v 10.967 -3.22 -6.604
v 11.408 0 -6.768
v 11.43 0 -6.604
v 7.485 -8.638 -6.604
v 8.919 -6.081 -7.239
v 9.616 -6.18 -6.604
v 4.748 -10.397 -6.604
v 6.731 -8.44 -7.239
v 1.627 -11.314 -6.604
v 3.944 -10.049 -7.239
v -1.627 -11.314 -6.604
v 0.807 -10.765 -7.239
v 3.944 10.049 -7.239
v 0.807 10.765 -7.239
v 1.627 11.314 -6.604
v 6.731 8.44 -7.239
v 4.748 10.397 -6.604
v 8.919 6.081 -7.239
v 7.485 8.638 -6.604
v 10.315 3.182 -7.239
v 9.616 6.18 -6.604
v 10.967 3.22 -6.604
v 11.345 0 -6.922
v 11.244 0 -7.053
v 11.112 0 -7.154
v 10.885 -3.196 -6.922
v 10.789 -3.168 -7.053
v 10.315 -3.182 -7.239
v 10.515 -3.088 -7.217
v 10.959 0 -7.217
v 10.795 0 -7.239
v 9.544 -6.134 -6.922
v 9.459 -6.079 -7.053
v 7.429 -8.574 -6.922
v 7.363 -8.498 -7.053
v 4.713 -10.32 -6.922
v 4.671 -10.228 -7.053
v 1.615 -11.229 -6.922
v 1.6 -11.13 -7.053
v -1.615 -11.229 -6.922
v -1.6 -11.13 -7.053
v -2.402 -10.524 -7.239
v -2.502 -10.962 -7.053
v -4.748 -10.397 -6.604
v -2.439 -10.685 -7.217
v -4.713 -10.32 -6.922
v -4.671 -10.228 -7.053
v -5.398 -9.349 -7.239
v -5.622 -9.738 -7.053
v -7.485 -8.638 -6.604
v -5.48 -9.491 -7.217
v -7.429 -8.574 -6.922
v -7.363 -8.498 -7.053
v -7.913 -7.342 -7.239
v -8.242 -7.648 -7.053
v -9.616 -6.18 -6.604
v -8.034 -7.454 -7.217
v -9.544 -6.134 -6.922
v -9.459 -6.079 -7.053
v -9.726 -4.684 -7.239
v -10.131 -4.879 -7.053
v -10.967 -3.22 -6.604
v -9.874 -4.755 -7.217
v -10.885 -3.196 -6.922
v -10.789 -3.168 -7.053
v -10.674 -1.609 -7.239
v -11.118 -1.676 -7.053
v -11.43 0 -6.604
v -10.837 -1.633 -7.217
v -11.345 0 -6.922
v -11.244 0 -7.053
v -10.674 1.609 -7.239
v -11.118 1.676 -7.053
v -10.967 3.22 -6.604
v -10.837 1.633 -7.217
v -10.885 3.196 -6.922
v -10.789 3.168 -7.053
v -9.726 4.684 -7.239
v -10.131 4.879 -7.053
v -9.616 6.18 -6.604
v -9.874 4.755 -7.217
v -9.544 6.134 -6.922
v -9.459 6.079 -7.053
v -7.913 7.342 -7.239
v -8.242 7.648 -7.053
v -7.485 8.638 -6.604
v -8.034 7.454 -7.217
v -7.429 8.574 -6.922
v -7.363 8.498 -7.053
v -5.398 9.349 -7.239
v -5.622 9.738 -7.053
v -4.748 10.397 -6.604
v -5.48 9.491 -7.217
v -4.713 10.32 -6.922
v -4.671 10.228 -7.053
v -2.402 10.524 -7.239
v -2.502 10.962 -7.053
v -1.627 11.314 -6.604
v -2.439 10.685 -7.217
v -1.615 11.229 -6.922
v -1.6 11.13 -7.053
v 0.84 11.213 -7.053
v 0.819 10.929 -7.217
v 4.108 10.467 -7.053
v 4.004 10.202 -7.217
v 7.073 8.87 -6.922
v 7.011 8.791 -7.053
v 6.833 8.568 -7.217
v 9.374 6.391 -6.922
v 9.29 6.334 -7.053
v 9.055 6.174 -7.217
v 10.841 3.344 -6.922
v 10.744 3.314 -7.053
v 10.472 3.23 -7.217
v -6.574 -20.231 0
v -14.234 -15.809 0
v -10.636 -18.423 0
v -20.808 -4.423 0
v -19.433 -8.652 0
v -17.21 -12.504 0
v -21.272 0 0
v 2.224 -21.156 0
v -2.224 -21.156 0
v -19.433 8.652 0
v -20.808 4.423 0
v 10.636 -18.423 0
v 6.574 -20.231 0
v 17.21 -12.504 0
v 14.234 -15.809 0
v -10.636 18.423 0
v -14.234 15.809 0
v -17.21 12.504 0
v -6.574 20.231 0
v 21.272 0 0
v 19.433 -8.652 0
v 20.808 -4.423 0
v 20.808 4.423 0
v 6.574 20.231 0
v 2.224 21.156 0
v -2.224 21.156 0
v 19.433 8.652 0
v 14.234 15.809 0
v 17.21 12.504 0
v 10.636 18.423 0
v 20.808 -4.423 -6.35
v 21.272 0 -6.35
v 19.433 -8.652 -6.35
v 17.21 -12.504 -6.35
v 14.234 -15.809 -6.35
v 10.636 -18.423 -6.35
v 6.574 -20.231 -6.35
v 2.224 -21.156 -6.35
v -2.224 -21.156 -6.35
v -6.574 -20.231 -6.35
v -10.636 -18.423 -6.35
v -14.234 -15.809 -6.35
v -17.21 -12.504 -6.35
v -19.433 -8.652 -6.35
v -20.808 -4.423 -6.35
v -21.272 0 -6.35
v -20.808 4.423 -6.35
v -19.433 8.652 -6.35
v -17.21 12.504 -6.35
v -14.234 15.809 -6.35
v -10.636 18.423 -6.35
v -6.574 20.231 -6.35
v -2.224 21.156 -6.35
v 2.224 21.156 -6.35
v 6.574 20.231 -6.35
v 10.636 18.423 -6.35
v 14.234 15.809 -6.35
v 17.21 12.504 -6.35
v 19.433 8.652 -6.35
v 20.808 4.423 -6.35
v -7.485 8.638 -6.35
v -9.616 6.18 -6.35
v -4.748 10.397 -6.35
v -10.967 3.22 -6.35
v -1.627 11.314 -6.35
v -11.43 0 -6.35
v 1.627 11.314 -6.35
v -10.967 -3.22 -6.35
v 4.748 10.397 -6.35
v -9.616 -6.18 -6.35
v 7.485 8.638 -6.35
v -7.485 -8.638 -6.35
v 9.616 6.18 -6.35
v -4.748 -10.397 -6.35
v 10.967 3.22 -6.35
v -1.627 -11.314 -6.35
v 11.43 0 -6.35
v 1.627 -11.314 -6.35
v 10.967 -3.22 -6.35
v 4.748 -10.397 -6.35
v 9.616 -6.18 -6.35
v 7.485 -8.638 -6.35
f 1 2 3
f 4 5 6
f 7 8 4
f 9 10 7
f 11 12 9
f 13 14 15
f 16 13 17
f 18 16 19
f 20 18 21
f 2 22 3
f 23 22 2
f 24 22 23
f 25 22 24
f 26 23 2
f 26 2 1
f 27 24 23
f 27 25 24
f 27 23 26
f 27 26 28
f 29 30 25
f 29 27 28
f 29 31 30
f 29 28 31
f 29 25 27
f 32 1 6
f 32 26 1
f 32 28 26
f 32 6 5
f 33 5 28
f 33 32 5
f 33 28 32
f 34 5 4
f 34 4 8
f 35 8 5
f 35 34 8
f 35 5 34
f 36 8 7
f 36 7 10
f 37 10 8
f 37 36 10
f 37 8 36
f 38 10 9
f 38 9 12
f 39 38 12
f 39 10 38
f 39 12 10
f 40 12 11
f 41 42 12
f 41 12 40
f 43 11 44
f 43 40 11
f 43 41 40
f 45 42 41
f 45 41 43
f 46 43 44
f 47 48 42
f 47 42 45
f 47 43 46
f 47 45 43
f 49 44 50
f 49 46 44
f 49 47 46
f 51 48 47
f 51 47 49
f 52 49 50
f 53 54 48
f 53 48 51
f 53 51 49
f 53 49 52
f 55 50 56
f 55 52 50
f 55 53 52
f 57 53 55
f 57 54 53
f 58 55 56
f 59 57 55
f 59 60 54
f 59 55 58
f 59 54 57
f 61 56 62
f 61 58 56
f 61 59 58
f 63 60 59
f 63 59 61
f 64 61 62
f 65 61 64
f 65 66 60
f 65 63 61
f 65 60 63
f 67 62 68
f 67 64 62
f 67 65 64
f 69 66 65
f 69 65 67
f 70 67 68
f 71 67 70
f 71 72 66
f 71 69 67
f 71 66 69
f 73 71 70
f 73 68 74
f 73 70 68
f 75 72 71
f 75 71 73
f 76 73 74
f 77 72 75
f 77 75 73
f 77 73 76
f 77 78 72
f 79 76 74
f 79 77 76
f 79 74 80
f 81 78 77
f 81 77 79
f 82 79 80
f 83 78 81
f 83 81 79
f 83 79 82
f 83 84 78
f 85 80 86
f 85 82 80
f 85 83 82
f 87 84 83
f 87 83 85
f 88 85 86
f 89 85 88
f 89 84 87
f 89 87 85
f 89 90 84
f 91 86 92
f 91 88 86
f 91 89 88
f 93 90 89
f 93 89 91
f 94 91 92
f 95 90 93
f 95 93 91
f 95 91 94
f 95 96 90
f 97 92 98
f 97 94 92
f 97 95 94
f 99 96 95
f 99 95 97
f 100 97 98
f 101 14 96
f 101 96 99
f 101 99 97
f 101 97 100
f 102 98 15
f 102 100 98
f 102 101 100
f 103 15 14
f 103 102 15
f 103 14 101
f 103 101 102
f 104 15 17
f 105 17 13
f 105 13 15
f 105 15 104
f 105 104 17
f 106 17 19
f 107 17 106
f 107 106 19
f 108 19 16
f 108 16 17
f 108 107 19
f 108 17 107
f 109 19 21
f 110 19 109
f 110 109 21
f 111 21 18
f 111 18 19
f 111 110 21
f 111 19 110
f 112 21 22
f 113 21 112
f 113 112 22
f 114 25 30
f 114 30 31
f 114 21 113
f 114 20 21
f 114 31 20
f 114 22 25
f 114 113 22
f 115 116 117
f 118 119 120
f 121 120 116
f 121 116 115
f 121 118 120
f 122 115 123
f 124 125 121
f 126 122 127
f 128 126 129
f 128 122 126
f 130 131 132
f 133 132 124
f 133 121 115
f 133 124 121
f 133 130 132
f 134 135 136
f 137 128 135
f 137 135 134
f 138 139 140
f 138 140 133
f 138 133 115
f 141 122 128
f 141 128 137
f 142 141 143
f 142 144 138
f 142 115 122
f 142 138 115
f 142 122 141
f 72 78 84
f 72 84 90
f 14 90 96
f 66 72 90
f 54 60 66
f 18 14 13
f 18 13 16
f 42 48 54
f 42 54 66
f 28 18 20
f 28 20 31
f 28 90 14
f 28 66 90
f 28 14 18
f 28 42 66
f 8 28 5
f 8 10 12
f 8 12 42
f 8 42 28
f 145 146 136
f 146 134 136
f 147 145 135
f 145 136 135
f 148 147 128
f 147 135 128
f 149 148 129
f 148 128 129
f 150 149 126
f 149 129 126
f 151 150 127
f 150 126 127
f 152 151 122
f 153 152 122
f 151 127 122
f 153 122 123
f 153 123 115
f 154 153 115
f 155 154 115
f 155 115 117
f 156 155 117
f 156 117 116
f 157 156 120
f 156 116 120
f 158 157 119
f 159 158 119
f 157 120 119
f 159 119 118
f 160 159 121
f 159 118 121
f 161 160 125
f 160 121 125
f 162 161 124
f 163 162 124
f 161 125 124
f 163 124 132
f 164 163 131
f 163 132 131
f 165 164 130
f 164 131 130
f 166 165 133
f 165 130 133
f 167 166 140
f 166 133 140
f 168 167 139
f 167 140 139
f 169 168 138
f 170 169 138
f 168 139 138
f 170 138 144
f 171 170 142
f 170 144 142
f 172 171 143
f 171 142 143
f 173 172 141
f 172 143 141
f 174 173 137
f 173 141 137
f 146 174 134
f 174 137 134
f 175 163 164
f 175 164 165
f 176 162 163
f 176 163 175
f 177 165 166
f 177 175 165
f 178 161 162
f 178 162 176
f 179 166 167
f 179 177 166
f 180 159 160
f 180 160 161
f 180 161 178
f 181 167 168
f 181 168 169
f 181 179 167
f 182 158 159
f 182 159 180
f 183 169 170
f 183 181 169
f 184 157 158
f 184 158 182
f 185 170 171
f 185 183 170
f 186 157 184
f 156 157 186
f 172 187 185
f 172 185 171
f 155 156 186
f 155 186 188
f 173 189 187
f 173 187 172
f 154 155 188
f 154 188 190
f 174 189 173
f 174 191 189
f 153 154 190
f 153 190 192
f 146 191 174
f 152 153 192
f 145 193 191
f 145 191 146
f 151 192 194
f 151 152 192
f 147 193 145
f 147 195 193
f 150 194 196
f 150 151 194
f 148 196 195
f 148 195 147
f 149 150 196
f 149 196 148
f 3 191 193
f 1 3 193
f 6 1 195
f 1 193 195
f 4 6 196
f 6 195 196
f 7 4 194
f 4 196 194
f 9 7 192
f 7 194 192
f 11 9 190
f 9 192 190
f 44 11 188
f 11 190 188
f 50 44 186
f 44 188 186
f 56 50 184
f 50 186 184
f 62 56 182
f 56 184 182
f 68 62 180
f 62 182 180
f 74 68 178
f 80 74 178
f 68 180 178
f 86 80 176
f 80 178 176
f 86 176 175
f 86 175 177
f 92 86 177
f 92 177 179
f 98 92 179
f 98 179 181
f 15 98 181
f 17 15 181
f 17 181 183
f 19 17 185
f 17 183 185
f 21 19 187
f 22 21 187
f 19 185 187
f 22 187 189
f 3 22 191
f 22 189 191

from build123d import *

# Parameters (mm, degrees)
F0_R     = 21.2725
F1_DEPTH = 3.175
F2_R     = 21.2725
F3_DEPTH = 3.175
F4_R     = 11.43
F5_DEPTH = 0.889
F6_R     = 0.635


with BuildPart() as f1:
    # F0 (on Top) → F1 (new body)
    with BuildSketch(Plane.XY):
        Circle(F0_R)
    extrude(amount=-F1_DEPTH)

    # F2 (on face) → F3 (join)
    with BuildSketch(Plane(origin=(0, 0, -3.175), x_dir=(1, 0, 0), z_dir=(0, 0, -1))):
        Circle(F2_R)
    extrude(amount=F3_DEPTH)

    # F4 (on face) → F5 (join)
    with BuildSketch(Plane(origin=(0, 0, -6.35), x_dir=(1, 0, 0), z_dir=(0, 0, -1))):
        Circle(F4_R)
    extrude(amount=F5_DEPTH)

    # F6
    f6_edges = [f1.edges().sort_by_distance(p)[0] for p in [
        (-11.43, 0, -7.239),
    ]]
    fillet(f6_edges, radius=F6_R)


solid = f1.part
